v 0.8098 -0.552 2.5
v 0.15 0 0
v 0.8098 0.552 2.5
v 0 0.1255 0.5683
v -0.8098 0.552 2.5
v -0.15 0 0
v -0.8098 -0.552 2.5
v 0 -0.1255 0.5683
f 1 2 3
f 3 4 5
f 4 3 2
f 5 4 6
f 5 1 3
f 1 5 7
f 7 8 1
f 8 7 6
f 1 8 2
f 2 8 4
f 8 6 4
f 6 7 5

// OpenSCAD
// file: include/conversion.scad
function rad2deg(x) = x * 180 / PI;
function deg2rad(x) = x * PI / 180;
// file: include/cameraview.scad
include <conversion.scad>

module cameraView(resolution_px,pixelPitch_um,focalLength_mm,range_m) {
    focalLength_m=focalLength_mm/1000;
    sensorSize_m = (pixelPitch_um/1000000)*resolution_px;
    range_mm=range_m*1000;

    echo("sensorSize (m)",sensorSize_m);

    dx = pixelPitch_um/1000*resolution_px[0];
    dy = pixelPitch_um/1000*resolution_px[1];

    vx = dx/(2*focalLength_mm);
    vy = dy/(2*focalLength_mm);

    //FOV (degrees)
    FOVx = 2*atan(vx);
    FOVy = 2*atan(vy);

    echo("FOV X (degrees)",FOVx);
    echo("FOV Y (degrees)",FOVy);
    
    focalLength_px=(resolution_px[0]/2)/tan(FOVx/2);
    echo("Focal length (px)",focalLength_px);

    //size at range (mm)
    atRangeX_mm = (range_mm*tan(FOVx/2)*2);
    atRangeY_mm = (range_mm*tan(FOVy/2)*2);

    atRangeX_m = atRangeX_mm/1000;
    atRangeY_m = atRangeY_mm/1000;

    echo("Image size X @ range (m)",atRangeX_m);
    echo("Image size Y @ range (m)",atRangeY_m);

    x=(atRangeX_m/2);
    y=(atRangeY_m/2);
    z=range_m;

    rotate(180, [ 1, 0, 0 ])
        translate([0,0,-z])
            polyhedron(
              points=[ [x,y,0],[x,-y,0],[-x,-y,0],[-x,y,0], // the four points at base
                       [0,0,z]  ],                          // the apex point 
              faces=[ [0,1,4],[1,2,4],[2,3,4],[3,0,4],      // each triangle side
                          [1,0,3],[2,1,3] ]                 // two triangles for square base
            );
};
// file: include/stereocameraview.scad
include <cameraview.scad>

module stereoCameraView(resolution_px,pixelPitch_um,focalLength_mm,range_m,overlap_only=false) {
    if (overlap_only){
        intersection(){
            echo("Camera 1");
            translate([baseline_m/2,0,0])
            cameraView(resolution_px,pixelPitch_um,focalLength_mm,range_m);
            echo("Camera 2");
            translate([-baseline_m/2,0,0])
            cameraView(resolution_px,pixelPitch_um,focalLength_mm,range_m); 
        }
    } else {
        echo("Camera 1");
        translate([baseline_m/2,0,0])
        cameraView(resolution_px,pixelPitch_um,focalLength_mm,range_m);
        echo("Camera 2");
        translate([-baseline_m/2,0,0])
        cameraView(resolution_px,pixelPitch_um,focalLength_mm,range_m);
    }
}
// main file
include <include/stereocameraview.scad>

resolution_px=[2448,2048]; //image resolution
pixelPitch_um=3.45; //um
focalLength_mm=16; //mm
range_m=2.5; //m
baseline_m=0.3; //m
overlap_only=false;

stereoCameraView(resolution_px,pixelPitch_um,focalLength_mm,range_m,overlap_only);
